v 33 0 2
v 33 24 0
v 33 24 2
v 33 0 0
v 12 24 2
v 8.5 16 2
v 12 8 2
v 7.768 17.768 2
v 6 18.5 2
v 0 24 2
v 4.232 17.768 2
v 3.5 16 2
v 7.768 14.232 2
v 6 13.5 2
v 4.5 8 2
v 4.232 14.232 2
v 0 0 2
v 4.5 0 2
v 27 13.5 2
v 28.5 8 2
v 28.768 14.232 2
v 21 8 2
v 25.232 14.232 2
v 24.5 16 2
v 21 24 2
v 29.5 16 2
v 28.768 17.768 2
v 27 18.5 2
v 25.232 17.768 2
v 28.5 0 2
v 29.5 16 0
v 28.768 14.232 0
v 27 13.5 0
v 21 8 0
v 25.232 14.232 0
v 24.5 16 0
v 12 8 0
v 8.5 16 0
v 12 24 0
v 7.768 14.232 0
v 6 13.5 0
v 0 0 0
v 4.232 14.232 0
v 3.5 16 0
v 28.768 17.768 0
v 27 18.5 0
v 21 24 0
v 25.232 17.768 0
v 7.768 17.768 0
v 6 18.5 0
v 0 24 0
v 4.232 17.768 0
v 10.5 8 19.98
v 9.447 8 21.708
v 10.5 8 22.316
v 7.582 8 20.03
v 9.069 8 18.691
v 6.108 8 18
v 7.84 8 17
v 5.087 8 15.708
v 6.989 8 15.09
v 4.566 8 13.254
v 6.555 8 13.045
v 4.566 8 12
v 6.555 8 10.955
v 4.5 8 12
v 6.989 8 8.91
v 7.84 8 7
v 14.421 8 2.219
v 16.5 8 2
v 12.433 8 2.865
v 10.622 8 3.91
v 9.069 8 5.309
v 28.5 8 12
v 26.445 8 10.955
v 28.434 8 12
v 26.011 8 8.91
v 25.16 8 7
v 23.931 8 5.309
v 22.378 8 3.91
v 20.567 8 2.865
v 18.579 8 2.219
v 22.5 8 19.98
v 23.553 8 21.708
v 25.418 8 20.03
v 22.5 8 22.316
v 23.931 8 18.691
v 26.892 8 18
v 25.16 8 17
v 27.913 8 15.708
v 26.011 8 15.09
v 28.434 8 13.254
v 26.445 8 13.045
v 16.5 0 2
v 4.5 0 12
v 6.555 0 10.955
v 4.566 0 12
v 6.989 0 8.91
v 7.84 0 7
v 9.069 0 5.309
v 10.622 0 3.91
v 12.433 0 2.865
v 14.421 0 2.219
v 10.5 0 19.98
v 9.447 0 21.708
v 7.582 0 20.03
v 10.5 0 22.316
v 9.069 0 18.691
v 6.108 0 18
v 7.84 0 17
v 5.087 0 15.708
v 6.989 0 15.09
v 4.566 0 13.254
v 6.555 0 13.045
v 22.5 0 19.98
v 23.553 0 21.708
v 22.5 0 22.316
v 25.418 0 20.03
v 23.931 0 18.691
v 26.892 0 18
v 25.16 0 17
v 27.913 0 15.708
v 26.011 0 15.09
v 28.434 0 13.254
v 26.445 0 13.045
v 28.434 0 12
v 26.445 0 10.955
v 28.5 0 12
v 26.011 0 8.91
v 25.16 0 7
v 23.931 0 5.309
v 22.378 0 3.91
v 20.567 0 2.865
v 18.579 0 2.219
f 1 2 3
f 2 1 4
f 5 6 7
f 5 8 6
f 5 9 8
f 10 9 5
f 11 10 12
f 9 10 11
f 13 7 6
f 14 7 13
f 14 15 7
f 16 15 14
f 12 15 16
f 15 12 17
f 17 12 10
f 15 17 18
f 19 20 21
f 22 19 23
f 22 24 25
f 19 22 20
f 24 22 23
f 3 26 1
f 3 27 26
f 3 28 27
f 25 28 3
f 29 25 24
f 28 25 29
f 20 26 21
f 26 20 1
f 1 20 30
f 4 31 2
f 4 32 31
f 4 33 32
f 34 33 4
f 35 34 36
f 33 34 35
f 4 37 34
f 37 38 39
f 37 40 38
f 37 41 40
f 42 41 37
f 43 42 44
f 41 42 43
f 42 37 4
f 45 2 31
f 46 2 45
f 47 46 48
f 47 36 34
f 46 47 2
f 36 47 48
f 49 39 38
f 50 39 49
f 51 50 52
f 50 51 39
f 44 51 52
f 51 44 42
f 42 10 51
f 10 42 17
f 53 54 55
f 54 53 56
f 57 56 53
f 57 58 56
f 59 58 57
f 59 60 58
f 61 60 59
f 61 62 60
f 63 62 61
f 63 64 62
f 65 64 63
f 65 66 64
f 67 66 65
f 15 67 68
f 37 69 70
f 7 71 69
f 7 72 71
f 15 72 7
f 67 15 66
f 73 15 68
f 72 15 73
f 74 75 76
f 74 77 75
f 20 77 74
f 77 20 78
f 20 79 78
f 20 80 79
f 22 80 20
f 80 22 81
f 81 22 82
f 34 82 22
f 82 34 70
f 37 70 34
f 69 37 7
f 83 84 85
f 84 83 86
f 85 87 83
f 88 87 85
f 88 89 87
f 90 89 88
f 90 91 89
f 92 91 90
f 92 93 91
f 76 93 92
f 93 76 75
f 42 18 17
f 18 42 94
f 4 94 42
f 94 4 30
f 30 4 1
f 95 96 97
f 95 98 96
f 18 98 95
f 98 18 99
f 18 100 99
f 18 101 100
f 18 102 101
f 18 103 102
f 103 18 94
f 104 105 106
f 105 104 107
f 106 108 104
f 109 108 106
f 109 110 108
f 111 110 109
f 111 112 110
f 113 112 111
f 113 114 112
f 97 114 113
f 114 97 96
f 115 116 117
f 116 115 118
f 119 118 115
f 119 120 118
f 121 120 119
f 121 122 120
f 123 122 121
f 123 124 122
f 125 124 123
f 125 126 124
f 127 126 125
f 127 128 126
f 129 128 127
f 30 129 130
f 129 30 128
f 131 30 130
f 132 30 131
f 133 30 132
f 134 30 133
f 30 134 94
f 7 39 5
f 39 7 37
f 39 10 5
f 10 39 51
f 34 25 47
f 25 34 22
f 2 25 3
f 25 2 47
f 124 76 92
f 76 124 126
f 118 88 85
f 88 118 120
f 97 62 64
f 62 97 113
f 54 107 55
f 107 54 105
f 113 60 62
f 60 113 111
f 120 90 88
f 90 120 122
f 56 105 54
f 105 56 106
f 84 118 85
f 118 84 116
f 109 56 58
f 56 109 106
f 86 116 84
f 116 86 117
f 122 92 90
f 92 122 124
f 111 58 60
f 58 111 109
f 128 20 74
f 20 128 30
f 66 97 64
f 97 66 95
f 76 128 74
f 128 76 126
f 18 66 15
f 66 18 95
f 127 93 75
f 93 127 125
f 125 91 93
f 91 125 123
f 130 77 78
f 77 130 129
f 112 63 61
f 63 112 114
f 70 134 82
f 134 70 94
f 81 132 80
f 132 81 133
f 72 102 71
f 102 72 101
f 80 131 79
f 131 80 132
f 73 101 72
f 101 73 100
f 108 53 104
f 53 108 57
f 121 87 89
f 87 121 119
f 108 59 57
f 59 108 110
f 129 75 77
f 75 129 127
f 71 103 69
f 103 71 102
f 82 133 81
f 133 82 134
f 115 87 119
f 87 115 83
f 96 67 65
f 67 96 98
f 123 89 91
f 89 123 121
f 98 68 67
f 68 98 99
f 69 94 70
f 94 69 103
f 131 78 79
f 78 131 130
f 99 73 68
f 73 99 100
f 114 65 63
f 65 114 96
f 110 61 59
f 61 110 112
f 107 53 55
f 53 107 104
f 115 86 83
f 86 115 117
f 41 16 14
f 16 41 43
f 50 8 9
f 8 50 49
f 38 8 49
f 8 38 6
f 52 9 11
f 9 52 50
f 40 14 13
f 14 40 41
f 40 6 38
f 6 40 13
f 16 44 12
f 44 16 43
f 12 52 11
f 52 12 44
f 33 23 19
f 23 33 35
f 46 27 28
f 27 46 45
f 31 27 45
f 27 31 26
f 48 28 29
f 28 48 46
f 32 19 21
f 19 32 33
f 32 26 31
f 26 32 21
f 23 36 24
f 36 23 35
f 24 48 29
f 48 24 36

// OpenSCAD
item_unit = 25;
screw_width = 4;

socket_dia        = 20;   // Diameter of the socket, mm
base_thickness    = 2;    // Thickness of the base, mm
mount_thickness   = 2;    // Mount of the base, mm
tolerance         = 0.25; // 3D printing tolerance per side, mm
cut_percent       = 60;   // % of the cut

difference() {
    total_width = item_unit + screw_width * 2;
    main_height = screw_width * 2;
    mount_width = screw_width * 3;
    mount_height = screw_width * 4;
    union() {
        cube(size = [total_width, main_height, base_thickness], center = false);
        translate([0, main_height, 0]) {
            cube(size = [mount_width, mount_height, base_thickness], center = false);
        }
        translate([total_width - mount_width, main_height, 0]) {
            cube(size = [mount_width, mount_height, base_thickness], center = false);
        }
        
        translate([total_width / 2, main_height / 2, socket_dia / 2 + mount_thickness]) {
            rotate([90, 90, 0]) {
                cylinder(r = socket_dia / 2 + mount_thickness, h = main_height, center = true);
            }
        }
        translate([total_width / 2 - socket_dia / 2 - mount_thickness, 0, 0]) {
            cube(size = [socket_dia + mount_thickness * 2, main_height, socket_dia / 2 + base_thickness], center = false);
        }
    }
    translate([total_width / 2, main_height / 2, socket_dia / 2 + mount_thickness]) {
        rotate([90, 90, 0]) {
            cylinder(r = socket_dia / 2, h = main_height, center = true);
        }
    }
    cut_width = socket_dia * cut_percent / 100;
    translate([total_width / 2 + cut_width / 2, 0, socket_dia / 2 + mount_thickness]) {
        rotate([0, -90, 0]) {
            cube(size = [cut_width, main_height, socket_dia / 2 + base_thickness], center = false);
        }
    }

    translate([mount_width / 2, main_height + mount_height / 2, base_thickness / 2]) {
        cylinder(r = screw_width / 2 + tolerance * 2, h = base_thickness, center = true);
    }
    translate([total_width - mount_width / 2, main_height + mount_height / 2, base_thickness / 2]) {
        cylinder(r = screw_width / 2 + tolerance * 2, h = base_thickness, center = true);
    }
}
